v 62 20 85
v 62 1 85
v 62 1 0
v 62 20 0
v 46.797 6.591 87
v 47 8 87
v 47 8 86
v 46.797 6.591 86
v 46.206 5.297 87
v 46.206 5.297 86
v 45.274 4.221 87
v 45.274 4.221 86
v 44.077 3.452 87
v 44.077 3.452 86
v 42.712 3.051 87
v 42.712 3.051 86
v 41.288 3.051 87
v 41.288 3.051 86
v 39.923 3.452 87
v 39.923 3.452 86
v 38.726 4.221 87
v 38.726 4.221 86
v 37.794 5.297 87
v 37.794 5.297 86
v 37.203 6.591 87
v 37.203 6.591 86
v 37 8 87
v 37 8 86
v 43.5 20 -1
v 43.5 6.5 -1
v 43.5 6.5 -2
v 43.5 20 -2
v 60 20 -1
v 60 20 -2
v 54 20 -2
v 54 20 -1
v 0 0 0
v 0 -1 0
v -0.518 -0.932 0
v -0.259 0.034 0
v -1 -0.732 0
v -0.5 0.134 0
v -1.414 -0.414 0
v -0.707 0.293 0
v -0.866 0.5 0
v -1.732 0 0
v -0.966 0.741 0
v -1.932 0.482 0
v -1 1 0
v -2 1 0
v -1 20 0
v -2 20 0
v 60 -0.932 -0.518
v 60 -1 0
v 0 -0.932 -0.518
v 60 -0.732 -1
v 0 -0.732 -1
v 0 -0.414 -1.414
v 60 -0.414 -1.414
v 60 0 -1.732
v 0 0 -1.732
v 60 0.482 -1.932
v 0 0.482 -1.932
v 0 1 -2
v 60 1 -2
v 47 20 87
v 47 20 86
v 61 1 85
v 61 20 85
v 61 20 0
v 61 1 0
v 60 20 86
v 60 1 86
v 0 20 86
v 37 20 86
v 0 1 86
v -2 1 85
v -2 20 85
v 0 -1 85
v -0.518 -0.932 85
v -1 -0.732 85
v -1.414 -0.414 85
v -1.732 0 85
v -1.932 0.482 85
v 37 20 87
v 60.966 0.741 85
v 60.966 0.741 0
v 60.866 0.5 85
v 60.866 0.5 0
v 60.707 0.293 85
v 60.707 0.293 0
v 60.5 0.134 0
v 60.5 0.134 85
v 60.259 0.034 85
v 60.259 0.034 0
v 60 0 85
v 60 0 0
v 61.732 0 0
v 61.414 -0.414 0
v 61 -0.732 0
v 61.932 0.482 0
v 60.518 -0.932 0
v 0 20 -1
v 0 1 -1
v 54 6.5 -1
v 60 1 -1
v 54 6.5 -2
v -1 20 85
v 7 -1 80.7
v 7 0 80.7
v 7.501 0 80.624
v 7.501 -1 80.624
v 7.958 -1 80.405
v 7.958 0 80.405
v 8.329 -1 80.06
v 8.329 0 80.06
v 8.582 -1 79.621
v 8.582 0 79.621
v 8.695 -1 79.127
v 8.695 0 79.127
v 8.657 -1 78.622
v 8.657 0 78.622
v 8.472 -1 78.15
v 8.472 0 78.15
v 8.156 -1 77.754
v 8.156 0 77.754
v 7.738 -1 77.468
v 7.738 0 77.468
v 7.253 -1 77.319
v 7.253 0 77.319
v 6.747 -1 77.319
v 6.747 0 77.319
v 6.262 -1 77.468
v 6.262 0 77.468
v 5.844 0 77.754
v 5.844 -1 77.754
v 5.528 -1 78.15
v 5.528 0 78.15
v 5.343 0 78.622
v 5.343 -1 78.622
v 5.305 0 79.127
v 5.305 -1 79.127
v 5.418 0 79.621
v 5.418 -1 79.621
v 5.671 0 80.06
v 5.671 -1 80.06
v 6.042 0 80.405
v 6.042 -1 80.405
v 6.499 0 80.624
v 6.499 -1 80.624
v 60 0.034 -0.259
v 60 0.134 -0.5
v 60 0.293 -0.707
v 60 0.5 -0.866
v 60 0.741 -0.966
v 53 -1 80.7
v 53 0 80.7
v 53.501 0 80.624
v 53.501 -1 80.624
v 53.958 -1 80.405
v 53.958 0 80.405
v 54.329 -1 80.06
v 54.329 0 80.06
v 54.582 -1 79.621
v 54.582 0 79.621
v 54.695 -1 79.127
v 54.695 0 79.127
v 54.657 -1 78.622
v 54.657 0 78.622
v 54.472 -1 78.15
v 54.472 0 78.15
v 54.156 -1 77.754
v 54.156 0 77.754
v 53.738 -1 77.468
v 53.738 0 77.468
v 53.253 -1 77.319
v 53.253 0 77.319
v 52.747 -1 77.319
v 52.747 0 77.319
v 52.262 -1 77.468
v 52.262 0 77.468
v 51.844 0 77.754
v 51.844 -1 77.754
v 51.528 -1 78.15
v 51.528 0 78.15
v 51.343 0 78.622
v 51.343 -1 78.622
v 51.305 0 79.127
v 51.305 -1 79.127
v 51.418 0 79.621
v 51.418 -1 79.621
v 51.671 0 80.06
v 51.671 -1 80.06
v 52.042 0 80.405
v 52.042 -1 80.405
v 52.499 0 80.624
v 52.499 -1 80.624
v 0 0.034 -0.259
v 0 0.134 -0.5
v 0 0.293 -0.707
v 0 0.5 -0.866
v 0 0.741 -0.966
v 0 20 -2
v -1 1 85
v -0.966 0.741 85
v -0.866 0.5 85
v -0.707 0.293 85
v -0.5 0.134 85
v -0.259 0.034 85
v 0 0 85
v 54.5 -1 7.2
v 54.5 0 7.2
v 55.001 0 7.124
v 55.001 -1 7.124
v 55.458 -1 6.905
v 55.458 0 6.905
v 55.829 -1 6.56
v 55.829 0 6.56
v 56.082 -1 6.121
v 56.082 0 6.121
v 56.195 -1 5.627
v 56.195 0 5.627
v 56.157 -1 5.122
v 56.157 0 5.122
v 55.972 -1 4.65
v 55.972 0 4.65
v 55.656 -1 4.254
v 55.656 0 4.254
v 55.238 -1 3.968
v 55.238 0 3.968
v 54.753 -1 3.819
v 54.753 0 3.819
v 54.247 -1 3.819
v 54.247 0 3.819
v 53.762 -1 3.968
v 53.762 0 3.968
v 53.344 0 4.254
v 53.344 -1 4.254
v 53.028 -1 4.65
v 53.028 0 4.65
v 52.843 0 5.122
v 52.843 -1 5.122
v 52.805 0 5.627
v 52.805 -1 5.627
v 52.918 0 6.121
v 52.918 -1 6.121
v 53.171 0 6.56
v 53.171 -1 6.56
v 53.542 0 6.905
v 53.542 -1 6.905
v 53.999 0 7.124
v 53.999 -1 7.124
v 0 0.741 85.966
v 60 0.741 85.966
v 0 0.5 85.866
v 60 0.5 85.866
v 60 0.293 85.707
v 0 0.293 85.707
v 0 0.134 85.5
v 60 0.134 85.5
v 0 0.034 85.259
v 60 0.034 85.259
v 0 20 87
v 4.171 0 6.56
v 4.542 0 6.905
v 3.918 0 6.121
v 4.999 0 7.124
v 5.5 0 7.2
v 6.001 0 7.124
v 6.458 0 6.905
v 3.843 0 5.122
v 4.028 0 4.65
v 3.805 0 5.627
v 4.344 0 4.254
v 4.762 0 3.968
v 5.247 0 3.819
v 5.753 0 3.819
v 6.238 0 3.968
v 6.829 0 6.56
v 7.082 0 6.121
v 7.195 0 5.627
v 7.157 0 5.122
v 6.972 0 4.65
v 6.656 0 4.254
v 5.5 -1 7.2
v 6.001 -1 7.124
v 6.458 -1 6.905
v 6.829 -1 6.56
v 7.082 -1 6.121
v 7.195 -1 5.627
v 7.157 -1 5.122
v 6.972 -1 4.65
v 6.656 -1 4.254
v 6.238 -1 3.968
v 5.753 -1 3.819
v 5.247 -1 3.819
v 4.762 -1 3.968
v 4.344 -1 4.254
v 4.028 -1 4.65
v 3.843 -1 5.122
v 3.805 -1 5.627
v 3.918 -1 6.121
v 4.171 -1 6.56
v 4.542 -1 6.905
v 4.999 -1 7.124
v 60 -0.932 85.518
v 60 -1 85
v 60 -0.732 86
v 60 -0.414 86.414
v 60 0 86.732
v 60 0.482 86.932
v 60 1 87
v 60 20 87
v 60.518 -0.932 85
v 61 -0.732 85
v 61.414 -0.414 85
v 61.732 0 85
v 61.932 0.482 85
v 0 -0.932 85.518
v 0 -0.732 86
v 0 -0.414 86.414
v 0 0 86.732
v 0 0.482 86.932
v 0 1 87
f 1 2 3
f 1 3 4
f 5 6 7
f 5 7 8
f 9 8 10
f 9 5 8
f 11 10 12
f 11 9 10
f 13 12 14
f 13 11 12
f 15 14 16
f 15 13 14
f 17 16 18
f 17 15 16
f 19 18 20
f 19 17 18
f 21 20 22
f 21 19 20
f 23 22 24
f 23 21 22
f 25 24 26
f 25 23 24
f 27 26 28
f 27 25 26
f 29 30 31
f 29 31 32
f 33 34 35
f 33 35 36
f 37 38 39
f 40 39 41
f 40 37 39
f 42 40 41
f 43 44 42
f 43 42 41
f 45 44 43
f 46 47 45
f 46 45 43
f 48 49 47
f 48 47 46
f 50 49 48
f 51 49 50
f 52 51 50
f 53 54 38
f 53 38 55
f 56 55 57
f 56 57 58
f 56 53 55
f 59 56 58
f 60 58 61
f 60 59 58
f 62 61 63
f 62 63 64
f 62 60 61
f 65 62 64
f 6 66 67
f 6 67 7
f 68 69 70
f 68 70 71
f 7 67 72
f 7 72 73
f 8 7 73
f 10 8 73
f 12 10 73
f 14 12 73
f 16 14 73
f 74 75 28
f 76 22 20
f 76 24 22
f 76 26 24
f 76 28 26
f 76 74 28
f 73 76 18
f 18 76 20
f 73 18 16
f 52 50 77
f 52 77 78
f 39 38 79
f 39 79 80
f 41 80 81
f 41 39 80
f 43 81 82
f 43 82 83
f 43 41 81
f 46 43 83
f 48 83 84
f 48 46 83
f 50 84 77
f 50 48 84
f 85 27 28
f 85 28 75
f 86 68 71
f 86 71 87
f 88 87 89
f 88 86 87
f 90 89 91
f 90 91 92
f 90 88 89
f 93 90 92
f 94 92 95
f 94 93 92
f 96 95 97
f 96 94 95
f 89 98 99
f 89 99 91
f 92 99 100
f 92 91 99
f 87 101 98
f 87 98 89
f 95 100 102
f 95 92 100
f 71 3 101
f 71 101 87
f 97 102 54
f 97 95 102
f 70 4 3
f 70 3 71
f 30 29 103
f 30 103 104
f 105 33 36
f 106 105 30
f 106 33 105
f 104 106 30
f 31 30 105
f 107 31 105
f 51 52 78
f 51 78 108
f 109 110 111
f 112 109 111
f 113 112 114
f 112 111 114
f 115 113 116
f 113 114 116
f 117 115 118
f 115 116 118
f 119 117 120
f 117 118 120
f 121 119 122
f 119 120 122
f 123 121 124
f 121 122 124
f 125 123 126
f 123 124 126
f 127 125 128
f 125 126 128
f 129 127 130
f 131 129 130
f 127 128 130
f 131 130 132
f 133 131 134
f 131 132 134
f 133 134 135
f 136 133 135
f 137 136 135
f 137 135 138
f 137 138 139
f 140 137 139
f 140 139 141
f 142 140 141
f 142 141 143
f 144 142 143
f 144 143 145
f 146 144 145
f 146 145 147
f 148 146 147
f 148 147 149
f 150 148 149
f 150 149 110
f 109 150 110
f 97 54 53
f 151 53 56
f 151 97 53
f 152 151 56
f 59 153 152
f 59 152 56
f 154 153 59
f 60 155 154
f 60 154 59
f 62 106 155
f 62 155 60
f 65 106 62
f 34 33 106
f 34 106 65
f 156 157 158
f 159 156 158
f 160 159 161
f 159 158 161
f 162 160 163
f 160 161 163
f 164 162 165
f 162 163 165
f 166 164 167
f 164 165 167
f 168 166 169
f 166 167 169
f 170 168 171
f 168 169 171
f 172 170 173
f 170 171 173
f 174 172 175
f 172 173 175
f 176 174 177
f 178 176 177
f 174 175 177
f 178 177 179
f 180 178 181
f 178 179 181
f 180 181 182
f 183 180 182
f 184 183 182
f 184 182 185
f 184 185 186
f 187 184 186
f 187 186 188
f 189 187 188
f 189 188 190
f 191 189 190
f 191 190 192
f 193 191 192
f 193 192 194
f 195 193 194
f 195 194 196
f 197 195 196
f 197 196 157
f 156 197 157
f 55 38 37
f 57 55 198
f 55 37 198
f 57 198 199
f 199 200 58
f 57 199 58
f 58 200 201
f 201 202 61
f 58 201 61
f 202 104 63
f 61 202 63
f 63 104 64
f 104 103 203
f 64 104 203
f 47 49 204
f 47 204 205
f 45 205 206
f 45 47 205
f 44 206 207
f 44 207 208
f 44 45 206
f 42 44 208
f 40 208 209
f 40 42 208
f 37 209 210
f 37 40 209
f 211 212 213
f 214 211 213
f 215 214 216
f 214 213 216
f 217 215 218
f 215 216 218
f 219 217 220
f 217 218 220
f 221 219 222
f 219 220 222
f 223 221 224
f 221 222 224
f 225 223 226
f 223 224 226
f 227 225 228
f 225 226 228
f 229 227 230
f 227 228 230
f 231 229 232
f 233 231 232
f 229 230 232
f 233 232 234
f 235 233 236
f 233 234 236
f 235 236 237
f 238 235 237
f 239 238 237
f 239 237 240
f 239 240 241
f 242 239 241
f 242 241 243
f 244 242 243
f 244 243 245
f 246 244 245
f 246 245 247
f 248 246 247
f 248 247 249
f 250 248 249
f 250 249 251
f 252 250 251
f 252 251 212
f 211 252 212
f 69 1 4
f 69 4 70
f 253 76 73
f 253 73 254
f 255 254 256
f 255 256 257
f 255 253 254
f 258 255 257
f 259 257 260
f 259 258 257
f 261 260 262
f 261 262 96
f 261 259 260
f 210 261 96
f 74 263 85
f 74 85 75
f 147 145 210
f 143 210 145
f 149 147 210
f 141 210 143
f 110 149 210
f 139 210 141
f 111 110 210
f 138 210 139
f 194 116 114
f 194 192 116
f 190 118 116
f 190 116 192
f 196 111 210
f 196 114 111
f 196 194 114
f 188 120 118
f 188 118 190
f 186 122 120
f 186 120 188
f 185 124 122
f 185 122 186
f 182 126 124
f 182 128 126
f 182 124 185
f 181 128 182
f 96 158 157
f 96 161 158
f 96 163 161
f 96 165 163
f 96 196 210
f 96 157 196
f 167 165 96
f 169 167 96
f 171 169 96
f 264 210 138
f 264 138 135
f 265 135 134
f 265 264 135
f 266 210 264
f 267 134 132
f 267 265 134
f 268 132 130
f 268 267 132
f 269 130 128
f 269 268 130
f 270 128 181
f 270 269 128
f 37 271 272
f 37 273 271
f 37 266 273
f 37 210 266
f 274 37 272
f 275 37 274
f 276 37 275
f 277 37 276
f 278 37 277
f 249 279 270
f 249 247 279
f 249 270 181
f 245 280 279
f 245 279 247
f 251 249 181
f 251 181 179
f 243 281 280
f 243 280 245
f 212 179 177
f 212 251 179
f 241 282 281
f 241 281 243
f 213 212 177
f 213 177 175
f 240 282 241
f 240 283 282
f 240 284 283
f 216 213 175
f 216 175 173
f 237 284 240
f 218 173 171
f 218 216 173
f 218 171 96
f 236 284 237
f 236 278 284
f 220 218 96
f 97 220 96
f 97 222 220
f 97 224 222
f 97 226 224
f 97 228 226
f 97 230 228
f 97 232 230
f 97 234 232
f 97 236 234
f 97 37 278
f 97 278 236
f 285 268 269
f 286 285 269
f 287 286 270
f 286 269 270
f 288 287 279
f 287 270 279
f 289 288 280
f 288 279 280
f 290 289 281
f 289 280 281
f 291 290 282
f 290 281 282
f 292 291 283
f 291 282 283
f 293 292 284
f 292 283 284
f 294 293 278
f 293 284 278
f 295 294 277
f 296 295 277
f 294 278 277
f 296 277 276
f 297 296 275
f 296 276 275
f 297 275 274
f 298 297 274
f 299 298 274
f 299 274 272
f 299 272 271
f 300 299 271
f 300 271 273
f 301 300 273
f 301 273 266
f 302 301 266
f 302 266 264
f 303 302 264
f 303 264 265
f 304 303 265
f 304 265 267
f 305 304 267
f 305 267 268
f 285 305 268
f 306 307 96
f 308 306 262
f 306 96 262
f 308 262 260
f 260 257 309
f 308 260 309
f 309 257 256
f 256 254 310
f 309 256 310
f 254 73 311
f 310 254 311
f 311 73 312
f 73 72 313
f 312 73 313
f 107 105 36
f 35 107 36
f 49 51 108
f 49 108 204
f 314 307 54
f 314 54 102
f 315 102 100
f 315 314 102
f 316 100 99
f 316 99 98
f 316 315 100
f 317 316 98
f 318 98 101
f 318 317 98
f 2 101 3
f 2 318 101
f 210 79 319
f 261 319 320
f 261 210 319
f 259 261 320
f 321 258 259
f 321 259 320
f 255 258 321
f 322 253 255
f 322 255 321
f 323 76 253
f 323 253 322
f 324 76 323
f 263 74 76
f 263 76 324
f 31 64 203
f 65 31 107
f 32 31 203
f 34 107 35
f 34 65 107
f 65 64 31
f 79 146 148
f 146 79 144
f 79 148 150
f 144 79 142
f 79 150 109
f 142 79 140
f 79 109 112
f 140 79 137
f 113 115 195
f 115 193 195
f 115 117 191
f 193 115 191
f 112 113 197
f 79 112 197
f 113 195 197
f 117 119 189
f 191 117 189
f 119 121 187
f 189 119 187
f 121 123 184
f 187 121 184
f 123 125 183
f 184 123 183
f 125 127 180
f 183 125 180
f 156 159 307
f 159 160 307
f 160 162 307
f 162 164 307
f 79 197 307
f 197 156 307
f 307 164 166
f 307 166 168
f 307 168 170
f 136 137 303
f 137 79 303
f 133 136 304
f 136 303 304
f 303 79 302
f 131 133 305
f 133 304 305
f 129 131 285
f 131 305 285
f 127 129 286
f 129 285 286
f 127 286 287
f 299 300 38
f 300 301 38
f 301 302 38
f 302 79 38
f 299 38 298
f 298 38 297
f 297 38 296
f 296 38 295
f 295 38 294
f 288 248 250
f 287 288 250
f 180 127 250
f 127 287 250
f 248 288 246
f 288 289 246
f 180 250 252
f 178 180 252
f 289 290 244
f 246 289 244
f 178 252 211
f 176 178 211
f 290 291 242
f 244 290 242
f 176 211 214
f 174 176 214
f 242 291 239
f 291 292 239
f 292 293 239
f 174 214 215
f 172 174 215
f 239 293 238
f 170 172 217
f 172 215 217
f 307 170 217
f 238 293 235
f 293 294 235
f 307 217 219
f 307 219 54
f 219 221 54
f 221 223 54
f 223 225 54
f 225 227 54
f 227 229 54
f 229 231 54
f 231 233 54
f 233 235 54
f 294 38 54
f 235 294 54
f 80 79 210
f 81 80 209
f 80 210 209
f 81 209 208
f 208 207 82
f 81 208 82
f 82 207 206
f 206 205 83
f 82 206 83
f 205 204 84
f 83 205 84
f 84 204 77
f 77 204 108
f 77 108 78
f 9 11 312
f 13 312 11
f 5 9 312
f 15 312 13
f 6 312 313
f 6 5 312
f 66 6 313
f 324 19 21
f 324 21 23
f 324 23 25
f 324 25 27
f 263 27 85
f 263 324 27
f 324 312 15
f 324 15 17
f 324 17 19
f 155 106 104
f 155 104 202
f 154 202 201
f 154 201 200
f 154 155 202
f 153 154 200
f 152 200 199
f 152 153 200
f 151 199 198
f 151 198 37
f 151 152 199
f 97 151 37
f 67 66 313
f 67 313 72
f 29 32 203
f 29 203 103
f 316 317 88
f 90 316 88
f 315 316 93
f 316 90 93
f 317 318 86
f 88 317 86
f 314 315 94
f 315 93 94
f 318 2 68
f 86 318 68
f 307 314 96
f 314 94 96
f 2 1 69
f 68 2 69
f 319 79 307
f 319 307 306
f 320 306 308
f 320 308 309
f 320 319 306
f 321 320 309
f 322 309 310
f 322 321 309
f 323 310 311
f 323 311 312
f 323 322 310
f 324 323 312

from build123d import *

# Parameters (mm, degrees)
SKETCH2_W          = 60
SKETCH2_H          = 1
BASE_FLANGE1_DEPTH = 85
EDGE_FLANGE1_DEPTH = 85
EDGE_FLANGE2_DEPTH = 85
EDGE_FLANGE3_DEPTH = 60
EDGE_FLANGE4_DEPTH = 60
CUT_EXTRUDE4_DEPTH = 1
SKETCH20_W         = 10.5
SKETCH20_H         = 13.5
CUT_EXTRUDE5_DEPTH = 1
SKETCH21_R         = 1.7
CUT_EXTRUDE6_DEPTH = 109.687625791


# Sheet-metal steps are written as plain solids
with BuildPart() as part:
    # Sketch2 → Base-Flange1 (new body)
    with BuildSketch(Plane.XY):
        with Locations((30, -0.5)):
            Rectangle(SKETCH2_W, SKETCH2_H)
    extrude(amount=BASE_FLANGE1_DEPTH)

    # Edge-Flange1 section (across the edge) → Edge-Flange1 (add)
    with BuildSketch(Plane(origin=(61, 0, 85), x_dir=(-1, 0, 0), z_dir=(0, 0, -1))):
        with BuildLine():
            Line((-1, 1), (-1, 20))
            Line((-1, 20), (0, 20))
            Line((0, 20), (0, 1))
            ThreePointArc((0, 1), (0.292893219, 0.292893219), (1, 0))
            Line((1, 0), (1, -1))
            ThreePointArc((1, -1), (-0.414213562, -0.414213562), (-1, 1))
        make_face()
    extrude(amount=EDGE_FLANGE1_DEPTH)

    # Edge-Flange2 section (across the edge) → Edge-Flange2 (add)
    with BuildSketch(Plane(origin=(-1, 0, 0), x_dir=(1, 0, 0), z_dir=(0, 0, 1))):
        with BuildLine():
            Line((-1, 1), (-1, 20))
            Line((-1, 20), (0, 20))
            Line((0, 20), (0, 1))
            ThreePointArc((0, 1), (0.292893219, 0.292893219), (1, 0))
            Line((1, 0), (1, -1))
            ThreePointArc((1, -1), (-0.414213562, -0.414213562), (-1, 1))
        make_face()
    extrude(amount=EDGE_FLANGE2_DEPTH)

    # Edge-Flange3 section (across the edge) → Edge-Flange3 (add)
    with BuildSketch(Plane(origin=(0, 0, 86), x_dir=(0, 0, -1), z_dir=(1, 0, 0))):
        with BuildLine():
            Line((-1, 1), (-1, 20))
            Line((-1, 20), (0, 20))
            Line((0, 20), (0, 1))
            ThreePointArc((0, 1), (0.292893219, 0.292893219), (1, 0))
            Line((1, 0), (1, -1))
            ThreePointArc((1, -1), (-0.414213562, -0.414213562), (-1, 1))
        make_face()
    extrude(amount=EDGE_FLANGE3_DEPTH)

    # Edge-Flange4 section (across the edge) → Edge-Flange4 (add)
    with BuildSketch(Plane(origin=(60, 0, -1), x_dir=(0, 0, 1), z_dir=(-1, 0, 0))):
        with BuildLine():
            Line((-1, 1), (-1, 20))
            Line((-1, 20), (0, 20))
            Line((0, 20), (0, 1))
            ThreePointArc((0, 1), (0.292893219, 0.292893219), (1, 0))
            Line((1, 0), (1, -1))
            ThreePointArc((1, -1), (-0.414213562, -0.414213562), (-1, 1))
        make_face()
    extrude(amount=EDGE_FLANGE4_DEPTH)

    # Sketch19 → Cut-Extrude4 (cut)
    with BuildSketch(Plane.XY.offset(87)):
        with BuildLine():
            Line((47, 20), (47, 8))
            ThreePointArc((47, 8), (42, 3), (37, 8))
            Line((37, 8), (37, 20))
            Line((37, 20), (47, 20))
        make_face()
    extrude(amount=-CUT_EXTRUDE4_DEPTH, mode=Mode.SUBTRACT)

    # Sketch20 → Cut-Extrude5 (cut)
    with BuildSketch(Plane.XY.offset(-1)):
        with Locations((48.75, 13.25)):
            Rectangle(SKETCH20_W, SKETCH20_H)
    extrude(amount=-CUT_EXTRUDE5_DEPTH, mode=Mode.SUBTRACT)

    # Sketch21 → Cut-Extrude6 (cut, through all)
    with BuildSketch(Plane(origin=(0, 0, 0), x_dir=(1, 0, 0), z_dir=(0, 1, 0))):
        with Locations(Location((5.5, -5.5, 0), (0, 0, 270))):
            Circle(SKETCH21_R)
        with Locations(Location((54.5, -5.5, 0), (0, 0, 270))):
            Circle(SKETCH21_R)
        with Locations(Location((53, -79, 0), (0, 0, 270))):
            Circle(SKETCH21_R)
        with Locations(Location((7, -79, 0), (0, 0, 270))):
            Circle(SKETCH21_R)
    extrude(amount=-CUT_EXTRUDE6_DEPTH, mode=Mode.SUBTRACT)


solid = part.part
